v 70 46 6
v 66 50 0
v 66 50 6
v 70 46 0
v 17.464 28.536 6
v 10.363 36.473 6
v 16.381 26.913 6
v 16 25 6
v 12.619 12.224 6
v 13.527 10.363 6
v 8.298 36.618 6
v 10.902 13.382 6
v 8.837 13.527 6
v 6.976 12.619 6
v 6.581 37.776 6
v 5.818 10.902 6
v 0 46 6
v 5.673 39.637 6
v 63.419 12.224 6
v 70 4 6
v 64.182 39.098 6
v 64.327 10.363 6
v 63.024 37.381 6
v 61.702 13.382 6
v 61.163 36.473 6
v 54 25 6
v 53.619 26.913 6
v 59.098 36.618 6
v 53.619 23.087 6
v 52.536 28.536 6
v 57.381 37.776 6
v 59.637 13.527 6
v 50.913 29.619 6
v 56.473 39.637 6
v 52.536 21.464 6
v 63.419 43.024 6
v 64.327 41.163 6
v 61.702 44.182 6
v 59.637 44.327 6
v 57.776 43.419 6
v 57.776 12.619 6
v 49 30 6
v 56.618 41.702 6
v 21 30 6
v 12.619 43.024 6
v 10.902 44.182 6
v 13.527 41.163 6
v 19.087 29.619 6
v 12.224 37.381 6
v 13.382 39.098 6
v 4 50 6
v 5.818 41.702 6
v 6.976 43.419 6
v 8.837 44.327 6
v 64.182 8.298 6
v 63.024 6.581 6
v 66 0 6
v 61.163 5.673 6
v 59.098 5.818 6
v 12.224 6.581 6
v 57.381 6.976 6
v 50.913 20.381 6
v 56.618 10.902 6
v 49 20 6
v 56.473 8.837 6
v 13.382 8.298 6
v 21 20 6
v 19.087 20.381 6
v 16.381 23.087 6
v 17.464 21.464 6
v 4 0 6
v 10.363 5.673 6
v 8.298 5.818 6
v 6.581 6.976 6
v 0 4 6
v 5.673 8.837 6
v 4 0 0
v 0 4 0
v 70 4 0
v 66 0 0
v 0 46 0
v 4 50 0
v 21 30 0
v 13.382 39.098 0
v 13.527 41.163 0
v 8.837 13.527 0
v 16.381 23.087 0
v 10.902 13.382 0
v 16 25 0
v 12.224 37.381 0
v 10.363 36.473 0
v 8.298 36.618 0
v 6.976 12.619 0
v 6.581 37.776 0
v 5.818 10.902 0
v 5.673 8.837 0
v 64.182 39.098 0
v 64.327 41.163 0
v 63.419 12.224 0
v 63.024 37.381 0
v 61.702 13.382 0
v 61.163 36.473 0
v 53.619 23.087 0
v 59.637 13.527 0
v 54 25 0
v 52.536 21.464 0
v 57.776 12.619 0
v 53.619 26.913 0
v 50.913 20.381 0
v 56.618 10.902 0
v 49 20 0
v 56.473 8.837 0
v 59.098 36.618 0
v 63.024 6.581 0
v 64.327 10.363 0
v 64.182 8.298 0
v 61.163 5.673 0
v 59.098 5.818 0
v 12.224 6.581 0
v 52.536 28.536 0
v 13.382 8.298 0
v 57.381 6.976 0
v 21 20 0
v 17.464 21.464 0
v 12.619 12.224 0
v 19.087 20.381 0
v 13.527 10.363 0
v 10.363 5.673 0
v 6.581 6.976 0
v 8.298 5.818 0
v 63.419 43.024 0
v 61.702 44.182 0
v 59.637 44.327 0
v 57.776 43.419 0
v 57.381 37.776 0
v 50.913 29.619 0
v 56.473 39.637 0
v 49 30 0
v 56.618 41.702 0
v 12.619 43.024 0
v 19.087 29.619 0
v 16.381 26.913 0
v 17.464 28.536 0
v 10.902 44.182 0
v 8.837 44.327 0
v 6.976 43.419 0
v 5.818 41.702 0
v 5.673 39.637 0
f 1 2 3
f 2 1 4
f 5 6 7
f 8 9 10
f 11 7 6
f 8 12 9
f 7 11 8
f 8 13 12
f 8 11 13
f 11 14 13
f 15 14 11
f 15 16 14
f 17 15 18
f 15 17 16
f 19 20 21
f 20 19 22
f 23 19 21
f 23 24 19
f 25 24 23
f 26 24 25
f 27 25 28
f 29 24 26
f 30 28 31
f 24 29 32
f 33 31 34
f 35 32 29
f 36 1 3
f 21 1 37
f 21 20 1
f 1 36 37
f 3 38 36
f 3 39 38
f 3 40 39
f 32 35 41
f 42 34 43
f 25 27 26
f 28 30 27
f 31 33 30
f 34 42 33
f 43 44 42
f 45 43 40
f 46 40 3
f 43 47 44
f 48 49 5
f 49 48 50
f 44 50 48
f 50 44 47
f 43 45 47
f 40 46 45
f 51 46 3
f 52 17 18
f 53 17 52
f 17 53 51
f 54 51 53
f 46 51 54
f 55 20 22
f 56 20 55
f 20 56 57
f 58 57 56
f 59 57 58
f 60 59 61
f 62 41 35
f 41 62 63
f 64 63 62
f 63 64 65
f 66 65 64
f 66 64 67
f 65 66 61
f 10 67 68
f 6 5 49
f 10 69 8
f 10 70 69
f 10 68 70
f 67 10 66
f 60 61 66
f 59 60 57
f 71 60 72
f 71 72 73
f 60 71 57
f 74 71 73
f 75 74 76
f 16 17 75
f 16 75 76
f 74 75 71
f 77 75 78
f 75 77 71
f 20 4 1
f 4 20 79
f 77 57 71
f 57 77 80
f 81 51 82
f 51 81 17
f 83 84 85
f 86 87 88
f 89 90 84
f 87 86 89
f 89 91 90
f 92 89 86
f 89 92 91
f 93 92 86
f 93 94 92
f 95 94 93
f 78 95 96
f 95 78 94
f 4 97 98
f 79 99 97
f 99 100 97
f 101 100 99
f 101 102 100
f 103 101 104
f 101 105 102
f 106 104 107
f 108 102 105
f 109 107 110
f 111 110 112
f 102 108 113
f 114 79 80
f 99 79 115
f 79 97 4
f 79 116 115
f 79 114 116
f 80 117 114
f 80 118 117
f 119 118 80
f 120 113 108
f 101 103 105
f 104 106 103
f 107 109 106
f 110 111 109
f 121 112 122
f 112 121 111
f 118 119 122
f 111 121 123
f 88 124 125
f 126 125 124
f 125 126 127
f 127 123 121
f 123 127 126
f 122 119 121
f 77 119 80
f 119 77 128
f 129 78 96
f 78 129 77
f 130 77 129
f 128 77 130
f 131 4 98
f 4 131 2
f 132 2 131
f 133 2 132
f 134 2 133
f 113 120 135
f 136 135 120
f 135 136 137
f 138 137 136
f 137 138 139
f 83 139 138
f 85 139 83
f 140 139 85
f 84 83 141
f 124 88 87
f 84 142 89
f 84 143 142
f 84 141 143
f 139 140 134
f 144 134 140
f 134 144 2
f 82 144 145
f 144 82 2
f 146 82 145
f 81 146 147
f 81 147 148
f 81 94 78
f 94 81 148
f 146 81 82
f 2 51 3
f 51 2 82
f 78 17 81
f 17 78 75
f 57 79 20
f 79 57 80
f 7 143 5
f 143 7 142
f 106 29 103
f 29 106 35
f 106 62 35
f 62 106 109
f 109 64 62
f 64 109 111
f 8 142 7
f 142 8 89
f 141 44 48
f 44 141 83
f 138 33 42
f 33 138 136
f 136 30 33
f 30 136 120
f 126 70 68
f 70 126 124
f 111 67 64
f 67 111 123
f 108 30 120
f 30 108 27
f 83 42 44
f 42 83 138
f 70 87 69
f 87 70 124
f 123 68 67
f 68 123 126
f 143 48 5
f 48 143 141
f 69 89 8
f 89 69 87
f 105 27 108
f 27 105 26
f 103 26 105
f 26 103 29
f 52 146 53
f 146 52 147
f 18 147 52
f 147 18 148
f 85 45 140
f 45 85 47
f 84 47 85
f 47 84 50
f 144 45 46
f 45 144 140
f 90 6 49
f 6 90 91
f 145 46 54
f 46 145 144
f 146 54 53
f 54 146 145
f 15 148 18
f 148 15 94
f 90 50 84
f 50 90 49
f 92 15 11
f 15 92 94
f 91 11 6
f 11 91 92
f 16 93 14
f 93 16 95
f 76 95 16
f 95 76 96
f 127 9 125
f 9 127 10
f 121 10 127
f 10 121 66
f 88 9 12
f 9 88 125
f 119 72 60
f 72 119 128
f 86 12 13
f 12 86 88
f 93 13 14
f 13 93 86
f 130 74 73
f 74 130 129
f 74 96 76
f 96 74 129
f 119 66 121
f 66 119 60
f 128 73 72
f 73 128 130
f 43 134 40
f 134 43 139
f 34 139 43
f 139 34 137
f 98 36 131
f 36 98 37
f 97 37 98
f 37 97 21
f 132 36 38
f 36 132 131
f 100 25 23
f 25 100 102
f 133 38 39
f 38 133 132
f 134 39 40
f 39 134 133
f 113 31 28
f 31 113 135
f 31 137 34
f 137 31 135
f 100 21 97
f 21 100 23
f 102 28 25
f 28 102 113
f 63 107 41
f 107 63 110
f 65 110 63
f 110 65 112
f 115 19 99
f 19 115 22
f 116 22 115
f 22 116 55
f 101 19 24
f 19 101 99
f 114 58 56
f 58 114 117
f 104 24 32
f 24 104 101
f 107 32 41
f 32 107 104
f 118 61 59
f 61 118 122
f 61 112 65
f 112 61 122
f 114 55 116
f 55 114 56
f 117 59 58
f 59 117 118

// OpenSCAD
$fn = 32;

// ----------------------------------------------------------------------
// Bracket plate: slot plate 70 x 50
// ----------------------------------------------------------------------

// --- parameters (mm) ---
hole_r = 4;               // bolt hole radius
plate_t = 6;              // plate thickness, Z (extrusion height)
plate_l = 70;             // plate length
plate_w = 50;             // plate width
slot_l = 28;              // slot straight length
slot_r = 5;               // slot end radius
fit_tol = 0.1;            // declared fit tolerance (prompt contract)
free_tol = 0.3;           // declared free tolerance (prompt contract)

slot_len = slot_l + 2 * slot_r;
slot_w = 2 * slot_r;
hole_d2 = 2 * hole_r;

profile = [[4, 0], [66, 0], [70, 4], [70, 46], [66, 50], [4, 50], [0, 46], [0, 4]];  // primary outline, 8 points, counter clockwise
void_1 = [[49, 20], [50.913, 20.381], [52.536, 21.464], [53.619, 23.087], [54, 25], [53.619, 26.913], [52.536, 28.536], [50.913, 29.619], [49, 30], [21, 30], [19.087, 29.619], [17.464, 28.536], [16.381, 26.913], [16, 25], [16.381, 23.087], [17.464, 21.464], [19.087, 20.381], [21, 20]];  // grip slot, 18 points
void_2 = [[13.527, 41.163], [12.619, 43.024], [10.902, 44.182], [8.837, 44.327], [6.976, 43.419], [5.818, 41.702], [5.673, 39.637], [6.581, 37.776], [8.298, 36.618], [10.363, 36.473], [12.224, 37.381], [13.382, 39.098]];  // corner hole, 12 points
void_3 = [[13.527, 10.363], [12.619, 12.224], [10.902, 13.382], [8.837, 13.527], [6.976, 12.619], [5.818, 10.902], [5.673, 8.837], [6.581, 6.976], [8.298, 5.818], [10.363, 5.673], [12.224, 6.581], [13.382, 8.298]];  // corner hole, 12 points
void_4 = [[64.327, 41.163], [63.419, 43.024], [61.702, 44.182], [59.637, 44.327], [57.776, 43.419], [56.618, 41.702], [56.473, 39.637], [57.381, 37.776], [59.098, 36.618], [61.163, 36.473], [63.024, 37.381], [64.182, 39.098]];  // corner hole, 12 points
void_5 = [[64.327, 10.363], [63.419, 12.224], [61.702, 13.382], [59.637, 13.527], [57.776, 12.619], [56.618, 10.902], [56.473, 8.837], [57.381, 6.976], [59.098, 5.818], [61.163, 5.673], [63.024, 6.581], [64.182, 8.298]];  // corner hole, 12 points

// --- the one profile operation ---
difference() {
  linear_extrude(height = plate_t) polygon(points = profile);
  translate([0, 0, -1])
    linear_extrude(height = plate_t + 2) polygon(points = void_1);
  translate([0, 0, -1])
    linear_extrude(height = plate_t + 2) polygon(points = void_2);
  translate([0, 0, -1])
    linear_extrude(height = plate_t + 2) polygon(points = void_3);
  translate([0, 0, -1])
    linear_extrude(height = plate_t + 2) polygon(points = void_4);
  translate([0, 0, -1])
    linear_extrude(height = plate_t + 2) polygon(points = void_5);
}
